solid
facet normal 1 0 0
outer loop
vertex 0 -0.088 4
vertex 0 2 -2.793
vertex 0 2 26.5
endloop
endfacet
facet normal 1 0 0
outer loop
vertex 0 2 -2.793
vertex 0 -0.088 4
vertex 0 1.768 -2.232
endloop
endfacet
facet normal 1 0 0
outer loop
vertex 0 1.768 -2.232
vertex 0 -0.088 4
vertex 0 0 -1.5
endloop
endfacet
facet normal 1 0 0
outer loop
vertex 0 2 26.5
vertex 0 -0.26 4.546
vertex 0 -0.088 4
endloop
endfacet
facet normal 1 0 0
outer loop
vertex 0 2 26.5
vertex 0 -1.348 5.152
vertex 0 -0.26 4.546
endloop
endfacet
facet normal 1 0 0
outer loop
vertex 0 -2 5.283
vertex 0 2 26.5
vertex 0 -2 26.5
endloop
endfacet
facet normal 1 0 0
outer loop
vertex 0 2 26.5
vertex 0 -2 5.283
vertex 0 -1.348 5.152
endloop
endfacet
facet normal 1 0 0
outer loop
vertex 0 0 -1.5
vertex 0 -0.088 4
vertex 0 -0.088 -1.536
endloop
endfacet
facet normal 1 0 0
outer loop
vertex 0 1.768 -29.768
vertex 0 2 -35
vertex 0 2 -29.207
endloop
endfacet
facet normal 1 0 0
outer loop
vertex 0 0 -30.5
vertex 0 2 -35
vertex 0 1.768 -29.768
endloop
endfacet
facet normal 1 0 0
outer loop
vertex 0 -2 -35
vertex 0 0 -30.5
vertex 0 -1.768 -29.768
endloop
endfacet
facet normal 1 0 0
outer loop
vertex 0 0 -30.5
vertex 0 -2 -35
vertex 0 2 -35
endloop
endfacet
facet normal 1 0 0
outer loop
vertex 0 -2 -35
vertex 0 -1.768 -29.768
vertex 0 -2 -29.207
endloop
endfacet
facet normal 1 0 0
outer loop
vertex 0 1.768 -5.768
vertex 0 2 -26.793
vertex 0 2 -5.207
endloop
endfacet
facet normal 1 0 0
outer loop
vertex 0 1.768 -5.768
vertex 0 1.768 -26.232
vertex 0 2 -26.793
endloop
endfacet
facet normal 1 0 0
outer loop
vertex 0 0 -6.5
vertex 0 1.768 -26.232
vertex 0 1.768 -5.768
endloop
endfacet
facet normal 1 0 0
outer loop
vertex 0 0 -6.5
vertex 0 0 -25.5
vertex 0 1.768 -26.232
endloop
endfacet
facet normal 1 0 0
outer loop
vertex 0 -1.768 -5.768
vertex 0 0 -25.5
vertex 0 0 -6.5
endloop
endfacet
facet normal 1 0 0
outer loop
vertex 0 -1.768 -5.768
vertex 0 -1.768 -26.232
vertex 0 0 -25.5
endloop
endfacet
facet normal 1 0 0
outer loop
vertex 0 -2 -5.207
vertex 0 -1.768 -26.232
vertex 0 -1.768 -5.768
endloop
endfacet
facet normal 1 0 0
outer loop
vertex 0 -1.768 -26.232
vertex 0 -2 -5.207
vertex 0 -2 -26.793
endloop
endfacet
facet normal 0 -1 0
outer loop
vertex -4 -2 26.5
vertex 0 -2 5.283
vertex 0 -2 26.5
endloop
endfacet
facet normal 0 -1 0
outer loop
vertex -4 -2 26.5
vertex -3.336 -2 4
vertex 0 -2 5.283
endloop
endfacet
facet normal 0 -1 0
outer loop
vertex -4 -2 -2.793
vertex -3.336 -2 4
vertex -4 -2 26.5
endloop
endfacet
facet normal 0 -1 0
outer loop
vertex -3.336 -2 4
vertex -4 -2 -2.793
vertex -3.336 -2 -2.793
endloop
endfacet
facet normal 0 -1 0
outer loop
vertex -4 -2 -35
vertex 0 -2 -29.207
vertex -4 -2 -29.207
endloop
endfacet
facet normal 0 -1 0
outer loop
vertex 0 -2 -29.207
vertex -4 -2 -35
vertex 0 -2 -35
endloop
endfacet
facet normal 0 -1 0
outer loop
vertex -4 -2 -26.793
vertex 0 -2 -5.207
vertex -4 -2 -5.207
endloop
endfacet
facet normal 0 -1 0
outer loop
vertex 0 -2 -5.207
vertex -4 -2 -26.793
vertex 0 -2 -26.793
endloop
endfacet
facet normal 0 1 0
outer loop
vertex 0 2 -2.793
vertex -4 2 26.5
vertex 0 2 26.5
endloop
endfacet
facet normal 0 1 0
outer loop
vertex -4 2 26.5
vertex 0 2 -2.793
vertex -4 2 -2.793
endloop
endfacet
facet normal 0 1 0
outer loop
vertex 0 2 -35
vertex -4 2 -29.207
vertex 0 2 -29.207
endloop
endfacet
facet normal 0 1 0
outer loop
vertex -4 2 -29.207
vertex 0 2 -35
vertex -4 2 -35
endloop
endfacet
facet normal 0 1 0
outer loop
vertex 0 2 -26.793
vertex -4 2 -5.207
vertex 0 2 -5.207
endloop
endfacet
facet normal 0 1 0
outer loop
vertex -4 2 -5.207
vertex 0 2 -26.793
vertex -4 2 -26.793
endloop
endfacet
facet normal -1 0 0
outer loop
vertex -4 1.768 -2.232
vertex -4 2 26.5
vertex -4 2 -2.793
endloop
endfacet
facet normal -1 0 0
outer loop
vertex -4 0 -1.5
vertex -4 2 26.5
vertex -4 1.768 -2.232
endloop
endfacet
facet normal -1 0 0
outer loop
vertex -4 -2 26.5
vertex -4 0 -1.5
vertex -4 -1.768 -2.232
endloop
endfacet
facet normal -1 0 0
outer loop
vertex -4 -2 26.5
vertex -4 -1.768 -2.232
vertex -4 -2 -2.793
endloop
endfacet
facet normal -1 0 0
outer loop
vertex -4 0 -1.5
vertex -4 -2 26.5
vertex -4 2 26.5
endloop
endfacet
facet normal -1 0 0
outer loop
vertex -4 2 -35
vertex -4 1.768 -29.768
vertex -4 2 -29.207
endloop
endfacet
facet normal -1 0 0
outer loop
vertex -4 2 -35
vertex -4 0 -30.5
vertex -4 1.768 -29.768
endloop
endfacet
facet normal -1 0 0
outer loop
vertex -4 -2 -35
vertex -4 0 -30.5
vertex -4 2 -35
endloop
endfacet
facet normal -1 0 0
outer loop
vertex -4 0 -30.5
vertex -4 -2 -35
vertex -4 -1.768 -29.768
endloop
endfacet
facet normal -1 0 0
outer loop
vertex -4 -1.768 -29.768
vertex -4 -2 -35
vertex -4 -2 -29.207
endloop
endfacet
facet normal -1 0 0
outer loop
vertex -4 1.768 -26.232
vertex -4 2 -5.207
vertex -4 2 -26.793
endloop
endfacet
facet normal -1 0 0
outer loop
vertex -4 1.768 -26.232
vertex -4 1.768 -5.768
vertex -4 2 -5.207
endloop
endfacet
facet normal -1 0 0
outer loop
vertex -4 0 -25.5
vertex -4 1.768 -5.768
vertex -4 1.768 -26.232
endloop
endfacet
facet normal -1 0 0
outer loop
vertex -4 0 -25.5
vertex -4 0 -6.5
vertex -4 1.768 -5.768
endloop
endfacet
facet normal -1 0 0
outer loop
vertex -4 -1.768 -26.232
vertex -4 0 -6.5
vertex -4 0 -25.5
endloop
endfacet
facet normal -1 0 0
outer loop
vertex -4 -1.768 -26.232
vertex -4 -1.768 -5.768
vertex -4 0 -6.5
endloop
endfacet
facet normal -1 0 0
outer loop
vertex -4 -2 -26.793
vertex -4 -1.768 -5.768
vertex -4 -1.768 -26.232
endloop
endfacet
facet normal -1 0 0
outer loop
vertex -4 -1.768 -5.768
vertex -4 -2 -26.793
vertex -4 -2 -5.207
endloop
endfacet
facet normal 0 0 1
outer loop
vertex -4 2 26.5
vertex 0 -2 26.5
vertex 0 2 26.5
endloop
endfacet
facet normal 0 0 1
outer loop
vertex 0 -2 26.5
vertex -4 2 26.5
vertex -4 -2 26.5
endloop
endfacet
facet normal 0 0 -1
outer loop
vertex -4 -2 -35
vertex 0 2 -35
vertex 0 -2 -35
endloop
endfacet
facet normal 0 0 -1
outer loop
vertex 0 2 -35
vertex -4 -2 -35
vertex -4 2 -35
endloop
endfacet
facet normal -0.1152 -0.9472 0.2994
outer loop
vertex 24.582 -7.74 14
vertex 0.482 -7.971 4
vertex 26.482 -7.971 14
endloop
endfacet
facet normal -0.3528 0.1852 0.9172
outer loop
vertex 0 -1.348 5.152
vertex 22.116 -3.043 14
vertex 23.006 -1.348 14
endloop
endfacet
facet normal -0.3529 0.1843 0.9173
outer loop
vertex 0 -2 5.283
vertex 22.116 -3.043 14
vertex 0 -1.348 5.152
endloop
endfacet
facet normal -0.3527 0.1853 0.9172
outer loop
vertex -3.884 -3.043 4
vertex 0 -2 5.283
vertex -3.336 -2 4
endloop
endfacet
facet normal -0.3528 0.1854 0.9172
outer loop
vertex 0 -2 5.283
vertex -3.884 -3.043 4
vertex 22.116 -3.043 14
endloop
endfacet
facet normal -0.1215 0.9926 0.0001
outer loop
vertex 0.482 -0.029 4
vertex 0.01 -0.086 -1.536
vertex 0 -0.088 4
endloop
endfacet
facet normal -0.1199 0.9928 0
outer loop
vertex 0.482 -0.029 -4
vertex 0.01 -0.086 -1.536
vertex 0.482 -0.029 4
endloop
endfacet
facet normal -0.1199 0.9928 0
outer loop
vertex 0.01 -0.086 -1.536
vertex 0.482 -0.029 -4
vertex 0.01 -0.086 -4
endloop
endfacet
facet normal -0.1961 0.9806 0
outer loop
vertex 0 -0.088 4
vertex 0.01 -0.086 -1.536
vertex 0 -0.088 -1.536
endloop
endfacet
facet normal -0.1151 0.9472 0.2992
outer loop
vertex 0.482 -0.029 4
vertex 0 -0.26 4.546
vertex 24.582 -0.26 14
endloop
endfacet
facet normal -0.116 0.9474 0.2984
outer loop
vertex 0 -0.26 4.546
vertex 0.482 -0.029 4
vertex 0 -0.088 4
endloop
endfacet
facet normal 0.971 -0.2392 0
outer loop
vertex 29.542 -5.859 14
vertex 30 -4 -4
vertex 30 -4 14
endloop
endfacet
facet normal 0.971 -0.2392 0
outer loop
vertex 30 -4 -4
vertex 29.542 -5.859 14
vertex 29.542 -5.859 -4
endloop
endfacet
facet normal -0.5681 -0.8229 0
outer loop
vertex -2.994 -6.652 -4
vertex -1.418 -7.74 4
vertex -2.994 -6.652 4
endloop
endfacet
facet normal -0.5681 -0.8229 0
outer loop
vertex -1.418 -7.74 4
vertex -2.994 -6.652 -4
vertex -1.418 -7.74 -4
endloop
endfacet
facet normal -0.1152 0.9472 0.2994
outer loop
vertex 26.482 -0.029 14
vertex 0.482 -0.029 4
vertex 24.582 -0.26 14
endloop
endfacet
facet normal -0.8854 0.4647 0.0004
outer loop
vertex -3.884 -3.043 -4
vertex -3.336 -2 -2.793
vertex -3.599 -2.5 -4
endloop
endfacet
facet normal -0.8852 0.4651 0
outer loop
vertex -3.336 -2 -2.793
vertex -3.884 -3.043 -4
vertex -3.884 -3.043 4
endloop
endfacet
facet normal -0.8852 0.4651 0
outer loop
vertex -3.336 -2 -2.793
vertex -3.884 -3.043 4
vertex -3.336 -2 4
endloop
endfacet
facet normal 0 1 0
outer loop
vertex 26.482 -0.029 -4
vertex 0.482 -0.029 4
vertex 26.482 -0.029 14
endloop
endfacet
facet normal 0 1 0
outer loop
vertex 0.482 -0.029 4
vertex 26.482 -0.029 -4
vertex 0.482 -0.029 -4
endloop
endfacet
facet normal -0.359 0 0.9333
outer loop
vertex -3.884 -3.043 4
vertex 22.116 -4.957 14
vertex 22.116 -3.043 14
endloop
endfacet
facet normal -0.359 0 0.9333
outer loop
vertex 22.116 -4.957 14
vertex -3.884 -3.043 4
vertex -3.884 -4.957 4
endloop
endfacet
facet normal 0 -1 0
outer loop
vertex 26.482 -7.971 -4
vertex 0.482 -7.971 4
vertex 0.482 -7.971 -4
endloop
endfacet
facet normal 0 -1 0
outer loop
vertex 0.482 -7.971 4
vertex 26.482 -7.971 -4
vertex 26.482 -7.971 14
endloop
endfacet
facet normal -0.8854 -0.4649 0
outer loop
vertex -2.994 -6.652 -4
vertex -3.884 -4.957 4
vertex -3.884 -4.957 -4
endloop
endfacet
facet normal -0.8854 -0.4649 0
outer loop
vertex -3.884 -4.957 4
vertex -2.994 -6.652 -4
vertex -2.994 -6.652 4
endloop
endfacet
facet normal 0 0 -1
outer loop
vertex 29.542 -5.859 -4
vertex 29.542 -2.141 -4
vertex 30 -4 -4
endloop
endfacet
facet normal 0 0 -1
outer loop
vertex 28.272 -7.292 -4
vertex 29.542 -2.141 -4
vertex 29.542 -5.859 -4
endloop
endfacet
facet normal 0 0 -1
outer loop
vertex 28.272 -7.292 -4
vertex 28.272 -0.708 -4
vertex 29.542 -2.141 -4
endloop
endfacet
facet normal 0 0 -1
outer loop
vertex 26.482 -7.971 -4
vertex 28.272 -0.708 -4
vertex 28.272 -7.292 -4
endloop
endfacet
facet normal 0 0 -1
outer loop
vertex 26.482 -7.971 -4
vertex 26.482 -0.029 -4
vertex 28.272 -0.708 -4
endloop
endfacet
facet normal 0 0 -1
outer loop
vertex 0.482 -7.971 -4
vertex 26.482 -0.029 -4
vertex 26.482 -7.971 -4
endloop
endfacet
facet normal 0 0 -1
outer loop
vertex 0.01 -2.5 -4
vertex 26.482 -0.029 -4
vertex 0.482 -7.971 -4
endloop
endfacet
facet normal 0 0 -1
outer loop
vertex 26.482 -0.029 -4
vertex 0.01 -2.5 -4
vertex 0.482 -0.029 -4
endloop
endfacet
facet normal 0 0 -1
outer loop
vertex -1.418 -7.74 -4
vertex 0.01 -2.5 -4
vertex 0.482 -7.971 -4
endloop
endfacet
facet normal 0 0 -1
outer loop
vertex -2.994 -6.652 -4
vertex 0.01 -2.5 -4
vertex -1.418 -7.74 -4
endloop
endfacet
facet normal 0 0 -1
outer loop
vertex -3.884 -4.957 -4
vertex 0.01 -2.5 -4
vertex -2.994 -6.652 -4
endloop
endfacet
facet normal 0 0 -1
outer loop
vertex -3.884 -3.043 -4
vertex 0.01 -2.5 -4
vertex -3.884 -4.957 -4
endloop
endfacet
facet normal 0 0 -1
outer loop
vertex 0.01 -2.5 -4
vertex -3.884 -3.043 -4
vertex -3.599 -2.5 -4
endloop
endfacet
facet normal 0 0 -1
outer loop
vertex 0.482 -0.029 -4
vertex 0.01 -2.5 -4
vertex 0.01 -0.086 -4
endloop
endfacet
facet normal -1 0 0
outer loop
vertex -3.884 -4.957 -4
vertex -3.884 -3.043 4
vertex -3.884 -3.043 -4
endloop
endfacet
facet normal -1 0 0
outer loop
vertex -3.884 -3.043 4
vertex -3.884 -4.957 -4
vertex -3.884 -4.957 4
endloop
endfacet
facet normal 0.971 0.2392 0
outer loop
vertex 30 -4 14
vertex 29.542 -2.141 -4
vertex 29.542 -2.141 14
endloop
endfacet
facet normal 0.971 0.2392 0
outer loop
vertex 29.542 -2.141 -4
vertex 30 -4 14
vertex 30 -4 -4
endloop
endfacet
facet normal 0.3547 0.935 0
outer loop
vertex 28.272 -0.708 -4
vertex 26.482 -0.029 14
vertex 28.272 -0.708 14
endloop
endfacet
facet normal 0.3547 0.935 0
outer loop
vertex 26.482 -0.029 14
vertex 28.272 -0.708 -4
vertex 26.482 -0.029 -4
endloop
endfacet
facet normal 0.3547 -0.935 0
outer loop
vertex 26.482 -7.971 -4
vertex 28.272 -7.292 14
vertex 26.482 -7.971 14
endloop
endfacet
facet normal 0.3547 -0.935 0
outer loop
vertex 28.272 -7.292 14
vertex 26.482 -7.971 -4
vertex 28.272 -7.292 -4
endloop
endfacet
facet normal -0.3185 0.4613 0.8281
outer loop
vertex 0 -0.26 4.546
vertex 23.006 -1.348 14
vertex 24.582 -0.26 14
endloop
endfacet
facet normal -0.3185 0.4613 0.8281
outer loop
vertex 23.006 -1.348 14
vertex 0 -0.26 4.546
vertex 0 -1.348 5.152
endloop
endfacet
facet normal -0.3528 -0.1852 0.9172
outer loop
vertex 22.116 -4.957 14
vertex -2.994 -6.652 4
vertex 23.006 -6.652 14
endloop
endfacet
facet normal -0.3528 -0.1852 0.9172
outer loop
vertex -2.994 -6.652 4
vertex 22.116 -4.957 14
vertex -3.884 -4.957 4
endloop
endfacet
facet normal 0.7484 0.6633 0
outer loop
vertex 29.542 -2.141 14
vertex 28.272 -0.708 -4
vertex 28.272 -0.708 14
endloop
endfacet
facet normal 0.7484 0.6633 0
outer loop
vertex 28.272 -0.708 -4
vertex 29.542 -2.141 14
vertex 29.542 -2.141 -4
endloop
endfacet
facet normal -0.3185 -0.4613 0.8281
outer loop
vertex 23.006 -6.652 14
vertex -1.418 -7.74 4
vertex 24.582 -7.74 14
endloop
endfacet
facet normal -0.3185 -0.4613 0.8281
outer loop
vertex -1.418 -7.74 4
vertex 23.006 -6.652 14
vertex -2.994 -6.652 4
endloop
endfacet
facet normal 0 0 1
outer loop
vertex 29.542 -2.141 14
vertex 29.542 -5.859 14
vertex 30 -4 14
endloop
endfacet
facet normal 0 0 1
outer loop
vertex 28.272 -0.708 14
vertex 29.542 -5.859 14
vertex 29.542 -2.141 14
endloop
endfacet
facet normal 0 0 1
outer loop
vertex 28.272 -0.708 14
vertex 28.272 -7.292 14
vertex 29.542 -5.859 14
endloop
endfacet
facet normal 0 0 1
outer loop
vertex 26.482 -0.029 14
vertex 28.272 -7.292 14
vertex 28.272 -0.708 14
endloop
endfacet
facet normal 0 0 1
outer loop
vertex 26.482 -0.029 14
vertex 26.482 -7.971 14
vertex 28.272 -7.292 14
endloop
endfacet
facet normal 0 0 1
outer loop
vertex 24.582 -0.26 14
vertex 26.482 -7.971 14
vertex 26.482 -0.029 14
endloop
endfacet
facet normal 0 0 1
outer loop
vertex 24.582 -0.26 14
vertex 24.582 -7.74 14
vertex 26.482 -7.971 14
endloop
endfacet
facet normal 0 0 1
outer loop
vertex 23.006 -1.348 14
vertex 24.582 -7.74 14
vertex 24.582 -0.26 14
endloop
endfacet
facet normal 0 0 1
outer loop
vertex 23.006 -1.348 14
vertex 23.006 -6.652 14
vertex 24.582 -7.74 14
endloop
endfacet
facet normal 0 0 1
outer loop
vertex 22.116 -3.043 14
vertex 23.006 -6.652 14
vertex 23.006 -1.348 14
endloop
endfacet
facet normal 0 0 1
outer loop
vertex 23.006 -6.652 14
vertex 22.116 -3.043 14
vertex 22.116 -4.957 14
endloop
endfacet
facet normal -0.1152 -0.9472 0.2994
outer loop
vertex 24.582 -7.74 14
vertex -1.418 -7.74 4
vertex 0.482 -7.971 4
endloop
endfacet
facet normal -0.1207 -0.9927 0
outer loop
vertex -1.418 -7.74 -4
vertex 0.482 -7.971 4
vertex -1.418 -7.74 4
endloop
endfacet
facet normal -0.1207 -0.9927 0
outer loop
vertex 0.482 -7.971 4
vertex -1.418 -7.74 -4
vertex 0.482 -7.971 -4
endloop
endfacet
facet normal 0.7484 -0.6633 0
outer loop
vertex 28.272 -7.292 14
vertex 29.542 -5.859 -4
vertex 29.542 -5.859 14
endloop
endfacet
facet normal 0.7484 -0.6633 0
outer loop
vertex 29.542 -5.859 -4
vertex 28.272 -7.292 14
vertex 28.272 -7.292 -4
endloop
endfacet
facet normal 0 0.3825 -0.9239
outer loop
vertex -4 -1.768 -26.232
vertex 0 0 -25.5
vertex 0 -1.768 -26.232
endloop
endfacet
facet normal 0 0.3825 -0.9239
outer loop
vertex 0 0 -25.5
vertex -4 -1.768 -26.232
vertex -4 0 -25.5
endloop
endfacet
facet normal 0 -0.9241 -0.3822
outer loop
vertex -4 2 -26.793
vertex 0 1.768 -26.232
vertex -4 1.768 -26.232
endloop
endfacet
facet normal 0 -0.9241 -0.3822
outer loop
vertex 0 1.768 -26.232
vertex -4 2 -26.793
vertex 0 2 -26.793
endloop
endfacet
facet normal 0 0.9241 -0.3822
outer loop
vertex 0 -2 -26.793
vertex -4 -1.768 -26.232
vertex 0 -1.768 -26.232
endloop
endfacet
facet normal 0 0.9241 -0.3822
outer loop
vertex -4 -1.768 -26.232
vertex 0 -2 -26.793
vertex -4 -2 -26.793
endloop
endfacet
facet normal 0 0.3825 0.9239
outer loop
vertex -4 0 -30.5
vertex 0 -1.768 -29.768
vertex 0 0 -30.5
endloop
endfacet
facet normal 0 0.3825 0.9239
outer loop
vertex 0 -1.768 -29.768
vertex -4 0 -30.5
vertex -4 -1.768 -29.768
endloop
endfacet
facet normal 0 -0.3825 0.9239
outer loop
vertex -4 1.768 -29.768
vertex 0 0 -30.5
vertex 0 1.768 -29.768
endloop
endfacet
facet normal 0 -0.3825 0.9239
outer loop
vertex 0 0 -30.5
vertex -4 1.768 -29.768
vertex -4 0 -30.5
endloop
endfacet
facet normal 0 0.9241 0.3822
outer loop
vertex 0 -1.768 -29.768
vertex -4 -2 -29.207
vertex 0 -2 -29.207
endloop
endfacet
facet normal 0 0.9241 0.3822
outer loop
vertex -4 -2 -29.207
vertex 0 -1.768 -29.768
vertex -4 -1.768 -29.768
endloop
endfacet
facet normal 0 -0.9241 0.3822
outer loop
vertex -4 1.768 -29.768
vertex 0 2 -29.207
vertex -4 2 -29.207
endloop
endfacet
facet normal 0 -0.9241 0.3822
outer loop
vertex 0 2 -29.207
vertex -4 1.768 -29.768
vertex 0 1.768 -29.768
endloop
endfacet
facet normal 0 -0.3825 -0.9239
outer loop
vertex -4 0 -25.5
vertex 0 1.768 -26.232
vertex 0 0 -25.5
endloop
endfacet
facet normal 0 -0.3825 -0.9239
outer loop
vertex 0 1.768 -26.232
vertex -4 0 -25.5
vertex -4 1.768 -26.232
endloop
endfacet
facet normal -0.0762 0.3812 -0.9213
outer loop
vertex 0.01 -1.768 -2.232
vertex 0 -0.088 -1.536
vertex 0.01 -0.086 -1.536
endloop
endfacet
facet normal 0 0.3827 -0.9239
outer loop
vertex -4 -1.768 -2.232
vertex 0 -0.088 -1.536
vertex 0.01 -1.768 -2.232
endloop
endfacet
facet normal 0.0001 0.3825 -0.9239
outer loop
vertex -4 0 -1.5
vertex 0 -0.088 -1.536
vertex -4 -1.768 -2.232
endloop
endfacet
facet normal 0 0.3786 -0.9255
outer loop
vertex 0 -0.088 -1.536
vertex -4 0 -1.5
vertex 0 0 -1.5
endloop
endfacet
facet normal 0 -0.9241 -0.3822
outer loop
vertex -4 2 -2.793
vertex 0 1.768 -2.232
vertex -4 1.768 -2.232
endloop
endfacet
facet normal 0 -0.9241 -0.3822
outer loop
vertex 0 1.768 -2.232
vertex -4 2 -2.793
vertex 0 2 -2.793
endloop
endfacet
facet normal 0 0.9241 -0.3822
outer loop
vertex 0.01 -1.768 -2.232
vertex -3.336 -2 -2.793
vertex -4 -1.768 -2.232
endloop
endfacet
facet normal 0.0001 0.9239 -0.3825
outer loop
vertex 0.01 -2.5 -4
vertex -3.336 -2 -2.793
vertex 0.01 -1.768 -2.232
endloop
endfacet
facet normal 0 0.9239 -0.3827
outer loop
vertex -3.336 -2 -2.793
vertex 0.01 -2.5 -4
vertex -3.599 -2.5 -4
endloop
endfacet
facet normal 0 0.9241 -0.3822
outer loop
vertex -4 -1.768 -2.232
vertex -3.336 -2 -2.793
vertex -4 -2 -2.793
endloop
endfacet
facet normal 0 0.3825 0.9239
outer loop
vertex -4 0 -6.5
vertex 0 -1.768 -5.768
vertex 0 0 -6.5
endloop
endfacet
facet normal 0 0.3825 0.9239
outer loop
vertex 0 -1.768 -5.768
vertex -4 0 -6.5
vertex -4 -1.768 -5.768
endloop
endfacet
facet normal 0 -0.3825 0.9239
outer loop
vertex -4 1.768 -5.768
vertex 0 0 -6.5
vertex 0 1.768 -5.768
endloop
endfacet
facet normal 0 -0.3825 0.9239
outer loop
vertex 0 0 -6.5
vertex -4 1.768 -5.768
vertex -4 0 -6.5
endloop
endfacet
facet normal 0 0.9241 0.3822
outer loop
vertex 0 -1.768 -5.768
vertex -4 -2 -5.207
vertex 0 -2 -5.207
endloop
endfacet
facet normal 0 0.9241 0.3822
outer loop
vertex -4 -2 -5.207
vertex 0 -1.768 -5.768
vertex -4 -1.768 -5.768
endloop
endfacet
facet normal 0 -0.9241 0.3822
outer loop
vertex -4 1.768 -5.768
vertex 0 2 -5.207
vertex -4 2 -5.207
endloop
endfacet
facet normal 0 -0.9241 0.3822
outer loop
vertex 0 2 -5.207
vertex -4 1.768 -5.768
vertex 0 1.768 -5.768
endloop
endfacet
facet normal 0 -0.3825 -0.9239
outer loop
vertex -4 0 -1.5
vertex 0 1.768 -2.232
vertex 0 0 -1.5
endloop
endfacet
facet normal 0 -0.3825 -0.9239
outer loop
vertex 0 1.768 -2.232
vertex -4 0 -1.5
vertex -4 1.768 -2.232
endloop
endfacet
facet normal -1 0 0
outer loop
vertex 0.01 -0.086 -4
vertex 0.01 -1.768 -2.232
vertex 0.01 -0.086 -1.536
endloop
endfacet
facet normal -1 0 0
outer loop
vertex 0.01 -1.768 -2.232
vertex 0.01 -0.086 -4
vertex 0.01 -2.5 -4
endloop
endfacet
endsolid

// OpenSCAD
// orcad: wall hook with a J-shaped arm, screw holes or a glue pad; prints flat, back face down.
hook_reach = 30;
hook_diameter = 8;
back_height = 22;
upturn = 10;
base_thickness = 4;
mount_style = 0; // [0:Screw holes, 1:Glue pad, 2:Pad and holes]
mount_hole_diameter = 5;
mount_spacing = 24;
mount_offset = 12;
pad_diameter = 20;
gusset_length = 12;

r = hook_diameter / 2;
reach_center = max(hook_reach - r, r + 1);
// The arm sinks into the plate so the two always share a solid joint.
bar_z = base_thickness - min(base_thickness / 2, 2) + r;
hole_y = -(r + mount_offset);
hole_low = hole_y - (mount_spacing > 0 ? mount_spacing / 2 : 0);
edge_margin = max(3, mount_hole_diameter / 2 + 2);
plate_y_min = (mount_style == 1) ? -r - edge_margin : hole_low - mount_hole_diameter / 2 - edge_margin;
plate_y_max = max(back_height, hook_diameter) + edge_margin;
pad_thickness = 1.5;
pad_d = min(pad_diameter, 2 * min(plate_y_max, -plate_y_min) - 2);
rib = min(hook_diameter, 6);

// The arm: a bar along x with a rounded tip that turns up into a short leg.
module arm() {
    hull() {
        translate([0, -r, bar_z]) rotate([-90, 0, 0]) cylinder(d = hook_diameter, h = hook_diameter);
        translate([reach_center, -r, bar_z]) rotate([-90, 0, 0]) cylinder(d = hook_diameter, h = upturn + hook_diameter);
    }
}

module flat_hook() {
    difference() {
        union() {
            // Back plate, lying flat so the mounting face is on the bed.
            translate([-base_thickness, plate_y_min, 0])
                cube([base_thickness, plate_y_max - plate_y_min, base_thickness]);

            // Gusset carrying the arm off the plate.
            if (gusset_length > 0)
                rotate([90, 0, 0])
                    linear_extrude(height = rib, center = true)
                        polygon([[0, bar_z], [gusset_length, bar_z], [0, base_thickness]]);

            arm();
        }

        if (mount_style != 1)
            for (y = (mount_spacing > 0 ? [hole_y - mount_spacing / 2, hole_y + mount_spacing / 2] : [hole_y]))
                translate([-base_thickness - 0.01, y, base_thickness / 2])
                    rotate([0, 90, 0]) cylinder(d = mount_hole_diameter, h = base_thickness + 0.02);
    }

    if (mount_style > 0)
        translate([-base_thickness - pad_thickness, 0, base_thickness / 2])
            rotate([0, 90, 0]) cylinder(d = pad_d, h = pad_thickness + 0.01);
}

// Lay the printed plate flat: x (out from the wall) stays, y (up the wall) becomes z.
translate([0, base_thickness / 2, 0])
    rotate([90, 0, 0])
        flat_hook();
